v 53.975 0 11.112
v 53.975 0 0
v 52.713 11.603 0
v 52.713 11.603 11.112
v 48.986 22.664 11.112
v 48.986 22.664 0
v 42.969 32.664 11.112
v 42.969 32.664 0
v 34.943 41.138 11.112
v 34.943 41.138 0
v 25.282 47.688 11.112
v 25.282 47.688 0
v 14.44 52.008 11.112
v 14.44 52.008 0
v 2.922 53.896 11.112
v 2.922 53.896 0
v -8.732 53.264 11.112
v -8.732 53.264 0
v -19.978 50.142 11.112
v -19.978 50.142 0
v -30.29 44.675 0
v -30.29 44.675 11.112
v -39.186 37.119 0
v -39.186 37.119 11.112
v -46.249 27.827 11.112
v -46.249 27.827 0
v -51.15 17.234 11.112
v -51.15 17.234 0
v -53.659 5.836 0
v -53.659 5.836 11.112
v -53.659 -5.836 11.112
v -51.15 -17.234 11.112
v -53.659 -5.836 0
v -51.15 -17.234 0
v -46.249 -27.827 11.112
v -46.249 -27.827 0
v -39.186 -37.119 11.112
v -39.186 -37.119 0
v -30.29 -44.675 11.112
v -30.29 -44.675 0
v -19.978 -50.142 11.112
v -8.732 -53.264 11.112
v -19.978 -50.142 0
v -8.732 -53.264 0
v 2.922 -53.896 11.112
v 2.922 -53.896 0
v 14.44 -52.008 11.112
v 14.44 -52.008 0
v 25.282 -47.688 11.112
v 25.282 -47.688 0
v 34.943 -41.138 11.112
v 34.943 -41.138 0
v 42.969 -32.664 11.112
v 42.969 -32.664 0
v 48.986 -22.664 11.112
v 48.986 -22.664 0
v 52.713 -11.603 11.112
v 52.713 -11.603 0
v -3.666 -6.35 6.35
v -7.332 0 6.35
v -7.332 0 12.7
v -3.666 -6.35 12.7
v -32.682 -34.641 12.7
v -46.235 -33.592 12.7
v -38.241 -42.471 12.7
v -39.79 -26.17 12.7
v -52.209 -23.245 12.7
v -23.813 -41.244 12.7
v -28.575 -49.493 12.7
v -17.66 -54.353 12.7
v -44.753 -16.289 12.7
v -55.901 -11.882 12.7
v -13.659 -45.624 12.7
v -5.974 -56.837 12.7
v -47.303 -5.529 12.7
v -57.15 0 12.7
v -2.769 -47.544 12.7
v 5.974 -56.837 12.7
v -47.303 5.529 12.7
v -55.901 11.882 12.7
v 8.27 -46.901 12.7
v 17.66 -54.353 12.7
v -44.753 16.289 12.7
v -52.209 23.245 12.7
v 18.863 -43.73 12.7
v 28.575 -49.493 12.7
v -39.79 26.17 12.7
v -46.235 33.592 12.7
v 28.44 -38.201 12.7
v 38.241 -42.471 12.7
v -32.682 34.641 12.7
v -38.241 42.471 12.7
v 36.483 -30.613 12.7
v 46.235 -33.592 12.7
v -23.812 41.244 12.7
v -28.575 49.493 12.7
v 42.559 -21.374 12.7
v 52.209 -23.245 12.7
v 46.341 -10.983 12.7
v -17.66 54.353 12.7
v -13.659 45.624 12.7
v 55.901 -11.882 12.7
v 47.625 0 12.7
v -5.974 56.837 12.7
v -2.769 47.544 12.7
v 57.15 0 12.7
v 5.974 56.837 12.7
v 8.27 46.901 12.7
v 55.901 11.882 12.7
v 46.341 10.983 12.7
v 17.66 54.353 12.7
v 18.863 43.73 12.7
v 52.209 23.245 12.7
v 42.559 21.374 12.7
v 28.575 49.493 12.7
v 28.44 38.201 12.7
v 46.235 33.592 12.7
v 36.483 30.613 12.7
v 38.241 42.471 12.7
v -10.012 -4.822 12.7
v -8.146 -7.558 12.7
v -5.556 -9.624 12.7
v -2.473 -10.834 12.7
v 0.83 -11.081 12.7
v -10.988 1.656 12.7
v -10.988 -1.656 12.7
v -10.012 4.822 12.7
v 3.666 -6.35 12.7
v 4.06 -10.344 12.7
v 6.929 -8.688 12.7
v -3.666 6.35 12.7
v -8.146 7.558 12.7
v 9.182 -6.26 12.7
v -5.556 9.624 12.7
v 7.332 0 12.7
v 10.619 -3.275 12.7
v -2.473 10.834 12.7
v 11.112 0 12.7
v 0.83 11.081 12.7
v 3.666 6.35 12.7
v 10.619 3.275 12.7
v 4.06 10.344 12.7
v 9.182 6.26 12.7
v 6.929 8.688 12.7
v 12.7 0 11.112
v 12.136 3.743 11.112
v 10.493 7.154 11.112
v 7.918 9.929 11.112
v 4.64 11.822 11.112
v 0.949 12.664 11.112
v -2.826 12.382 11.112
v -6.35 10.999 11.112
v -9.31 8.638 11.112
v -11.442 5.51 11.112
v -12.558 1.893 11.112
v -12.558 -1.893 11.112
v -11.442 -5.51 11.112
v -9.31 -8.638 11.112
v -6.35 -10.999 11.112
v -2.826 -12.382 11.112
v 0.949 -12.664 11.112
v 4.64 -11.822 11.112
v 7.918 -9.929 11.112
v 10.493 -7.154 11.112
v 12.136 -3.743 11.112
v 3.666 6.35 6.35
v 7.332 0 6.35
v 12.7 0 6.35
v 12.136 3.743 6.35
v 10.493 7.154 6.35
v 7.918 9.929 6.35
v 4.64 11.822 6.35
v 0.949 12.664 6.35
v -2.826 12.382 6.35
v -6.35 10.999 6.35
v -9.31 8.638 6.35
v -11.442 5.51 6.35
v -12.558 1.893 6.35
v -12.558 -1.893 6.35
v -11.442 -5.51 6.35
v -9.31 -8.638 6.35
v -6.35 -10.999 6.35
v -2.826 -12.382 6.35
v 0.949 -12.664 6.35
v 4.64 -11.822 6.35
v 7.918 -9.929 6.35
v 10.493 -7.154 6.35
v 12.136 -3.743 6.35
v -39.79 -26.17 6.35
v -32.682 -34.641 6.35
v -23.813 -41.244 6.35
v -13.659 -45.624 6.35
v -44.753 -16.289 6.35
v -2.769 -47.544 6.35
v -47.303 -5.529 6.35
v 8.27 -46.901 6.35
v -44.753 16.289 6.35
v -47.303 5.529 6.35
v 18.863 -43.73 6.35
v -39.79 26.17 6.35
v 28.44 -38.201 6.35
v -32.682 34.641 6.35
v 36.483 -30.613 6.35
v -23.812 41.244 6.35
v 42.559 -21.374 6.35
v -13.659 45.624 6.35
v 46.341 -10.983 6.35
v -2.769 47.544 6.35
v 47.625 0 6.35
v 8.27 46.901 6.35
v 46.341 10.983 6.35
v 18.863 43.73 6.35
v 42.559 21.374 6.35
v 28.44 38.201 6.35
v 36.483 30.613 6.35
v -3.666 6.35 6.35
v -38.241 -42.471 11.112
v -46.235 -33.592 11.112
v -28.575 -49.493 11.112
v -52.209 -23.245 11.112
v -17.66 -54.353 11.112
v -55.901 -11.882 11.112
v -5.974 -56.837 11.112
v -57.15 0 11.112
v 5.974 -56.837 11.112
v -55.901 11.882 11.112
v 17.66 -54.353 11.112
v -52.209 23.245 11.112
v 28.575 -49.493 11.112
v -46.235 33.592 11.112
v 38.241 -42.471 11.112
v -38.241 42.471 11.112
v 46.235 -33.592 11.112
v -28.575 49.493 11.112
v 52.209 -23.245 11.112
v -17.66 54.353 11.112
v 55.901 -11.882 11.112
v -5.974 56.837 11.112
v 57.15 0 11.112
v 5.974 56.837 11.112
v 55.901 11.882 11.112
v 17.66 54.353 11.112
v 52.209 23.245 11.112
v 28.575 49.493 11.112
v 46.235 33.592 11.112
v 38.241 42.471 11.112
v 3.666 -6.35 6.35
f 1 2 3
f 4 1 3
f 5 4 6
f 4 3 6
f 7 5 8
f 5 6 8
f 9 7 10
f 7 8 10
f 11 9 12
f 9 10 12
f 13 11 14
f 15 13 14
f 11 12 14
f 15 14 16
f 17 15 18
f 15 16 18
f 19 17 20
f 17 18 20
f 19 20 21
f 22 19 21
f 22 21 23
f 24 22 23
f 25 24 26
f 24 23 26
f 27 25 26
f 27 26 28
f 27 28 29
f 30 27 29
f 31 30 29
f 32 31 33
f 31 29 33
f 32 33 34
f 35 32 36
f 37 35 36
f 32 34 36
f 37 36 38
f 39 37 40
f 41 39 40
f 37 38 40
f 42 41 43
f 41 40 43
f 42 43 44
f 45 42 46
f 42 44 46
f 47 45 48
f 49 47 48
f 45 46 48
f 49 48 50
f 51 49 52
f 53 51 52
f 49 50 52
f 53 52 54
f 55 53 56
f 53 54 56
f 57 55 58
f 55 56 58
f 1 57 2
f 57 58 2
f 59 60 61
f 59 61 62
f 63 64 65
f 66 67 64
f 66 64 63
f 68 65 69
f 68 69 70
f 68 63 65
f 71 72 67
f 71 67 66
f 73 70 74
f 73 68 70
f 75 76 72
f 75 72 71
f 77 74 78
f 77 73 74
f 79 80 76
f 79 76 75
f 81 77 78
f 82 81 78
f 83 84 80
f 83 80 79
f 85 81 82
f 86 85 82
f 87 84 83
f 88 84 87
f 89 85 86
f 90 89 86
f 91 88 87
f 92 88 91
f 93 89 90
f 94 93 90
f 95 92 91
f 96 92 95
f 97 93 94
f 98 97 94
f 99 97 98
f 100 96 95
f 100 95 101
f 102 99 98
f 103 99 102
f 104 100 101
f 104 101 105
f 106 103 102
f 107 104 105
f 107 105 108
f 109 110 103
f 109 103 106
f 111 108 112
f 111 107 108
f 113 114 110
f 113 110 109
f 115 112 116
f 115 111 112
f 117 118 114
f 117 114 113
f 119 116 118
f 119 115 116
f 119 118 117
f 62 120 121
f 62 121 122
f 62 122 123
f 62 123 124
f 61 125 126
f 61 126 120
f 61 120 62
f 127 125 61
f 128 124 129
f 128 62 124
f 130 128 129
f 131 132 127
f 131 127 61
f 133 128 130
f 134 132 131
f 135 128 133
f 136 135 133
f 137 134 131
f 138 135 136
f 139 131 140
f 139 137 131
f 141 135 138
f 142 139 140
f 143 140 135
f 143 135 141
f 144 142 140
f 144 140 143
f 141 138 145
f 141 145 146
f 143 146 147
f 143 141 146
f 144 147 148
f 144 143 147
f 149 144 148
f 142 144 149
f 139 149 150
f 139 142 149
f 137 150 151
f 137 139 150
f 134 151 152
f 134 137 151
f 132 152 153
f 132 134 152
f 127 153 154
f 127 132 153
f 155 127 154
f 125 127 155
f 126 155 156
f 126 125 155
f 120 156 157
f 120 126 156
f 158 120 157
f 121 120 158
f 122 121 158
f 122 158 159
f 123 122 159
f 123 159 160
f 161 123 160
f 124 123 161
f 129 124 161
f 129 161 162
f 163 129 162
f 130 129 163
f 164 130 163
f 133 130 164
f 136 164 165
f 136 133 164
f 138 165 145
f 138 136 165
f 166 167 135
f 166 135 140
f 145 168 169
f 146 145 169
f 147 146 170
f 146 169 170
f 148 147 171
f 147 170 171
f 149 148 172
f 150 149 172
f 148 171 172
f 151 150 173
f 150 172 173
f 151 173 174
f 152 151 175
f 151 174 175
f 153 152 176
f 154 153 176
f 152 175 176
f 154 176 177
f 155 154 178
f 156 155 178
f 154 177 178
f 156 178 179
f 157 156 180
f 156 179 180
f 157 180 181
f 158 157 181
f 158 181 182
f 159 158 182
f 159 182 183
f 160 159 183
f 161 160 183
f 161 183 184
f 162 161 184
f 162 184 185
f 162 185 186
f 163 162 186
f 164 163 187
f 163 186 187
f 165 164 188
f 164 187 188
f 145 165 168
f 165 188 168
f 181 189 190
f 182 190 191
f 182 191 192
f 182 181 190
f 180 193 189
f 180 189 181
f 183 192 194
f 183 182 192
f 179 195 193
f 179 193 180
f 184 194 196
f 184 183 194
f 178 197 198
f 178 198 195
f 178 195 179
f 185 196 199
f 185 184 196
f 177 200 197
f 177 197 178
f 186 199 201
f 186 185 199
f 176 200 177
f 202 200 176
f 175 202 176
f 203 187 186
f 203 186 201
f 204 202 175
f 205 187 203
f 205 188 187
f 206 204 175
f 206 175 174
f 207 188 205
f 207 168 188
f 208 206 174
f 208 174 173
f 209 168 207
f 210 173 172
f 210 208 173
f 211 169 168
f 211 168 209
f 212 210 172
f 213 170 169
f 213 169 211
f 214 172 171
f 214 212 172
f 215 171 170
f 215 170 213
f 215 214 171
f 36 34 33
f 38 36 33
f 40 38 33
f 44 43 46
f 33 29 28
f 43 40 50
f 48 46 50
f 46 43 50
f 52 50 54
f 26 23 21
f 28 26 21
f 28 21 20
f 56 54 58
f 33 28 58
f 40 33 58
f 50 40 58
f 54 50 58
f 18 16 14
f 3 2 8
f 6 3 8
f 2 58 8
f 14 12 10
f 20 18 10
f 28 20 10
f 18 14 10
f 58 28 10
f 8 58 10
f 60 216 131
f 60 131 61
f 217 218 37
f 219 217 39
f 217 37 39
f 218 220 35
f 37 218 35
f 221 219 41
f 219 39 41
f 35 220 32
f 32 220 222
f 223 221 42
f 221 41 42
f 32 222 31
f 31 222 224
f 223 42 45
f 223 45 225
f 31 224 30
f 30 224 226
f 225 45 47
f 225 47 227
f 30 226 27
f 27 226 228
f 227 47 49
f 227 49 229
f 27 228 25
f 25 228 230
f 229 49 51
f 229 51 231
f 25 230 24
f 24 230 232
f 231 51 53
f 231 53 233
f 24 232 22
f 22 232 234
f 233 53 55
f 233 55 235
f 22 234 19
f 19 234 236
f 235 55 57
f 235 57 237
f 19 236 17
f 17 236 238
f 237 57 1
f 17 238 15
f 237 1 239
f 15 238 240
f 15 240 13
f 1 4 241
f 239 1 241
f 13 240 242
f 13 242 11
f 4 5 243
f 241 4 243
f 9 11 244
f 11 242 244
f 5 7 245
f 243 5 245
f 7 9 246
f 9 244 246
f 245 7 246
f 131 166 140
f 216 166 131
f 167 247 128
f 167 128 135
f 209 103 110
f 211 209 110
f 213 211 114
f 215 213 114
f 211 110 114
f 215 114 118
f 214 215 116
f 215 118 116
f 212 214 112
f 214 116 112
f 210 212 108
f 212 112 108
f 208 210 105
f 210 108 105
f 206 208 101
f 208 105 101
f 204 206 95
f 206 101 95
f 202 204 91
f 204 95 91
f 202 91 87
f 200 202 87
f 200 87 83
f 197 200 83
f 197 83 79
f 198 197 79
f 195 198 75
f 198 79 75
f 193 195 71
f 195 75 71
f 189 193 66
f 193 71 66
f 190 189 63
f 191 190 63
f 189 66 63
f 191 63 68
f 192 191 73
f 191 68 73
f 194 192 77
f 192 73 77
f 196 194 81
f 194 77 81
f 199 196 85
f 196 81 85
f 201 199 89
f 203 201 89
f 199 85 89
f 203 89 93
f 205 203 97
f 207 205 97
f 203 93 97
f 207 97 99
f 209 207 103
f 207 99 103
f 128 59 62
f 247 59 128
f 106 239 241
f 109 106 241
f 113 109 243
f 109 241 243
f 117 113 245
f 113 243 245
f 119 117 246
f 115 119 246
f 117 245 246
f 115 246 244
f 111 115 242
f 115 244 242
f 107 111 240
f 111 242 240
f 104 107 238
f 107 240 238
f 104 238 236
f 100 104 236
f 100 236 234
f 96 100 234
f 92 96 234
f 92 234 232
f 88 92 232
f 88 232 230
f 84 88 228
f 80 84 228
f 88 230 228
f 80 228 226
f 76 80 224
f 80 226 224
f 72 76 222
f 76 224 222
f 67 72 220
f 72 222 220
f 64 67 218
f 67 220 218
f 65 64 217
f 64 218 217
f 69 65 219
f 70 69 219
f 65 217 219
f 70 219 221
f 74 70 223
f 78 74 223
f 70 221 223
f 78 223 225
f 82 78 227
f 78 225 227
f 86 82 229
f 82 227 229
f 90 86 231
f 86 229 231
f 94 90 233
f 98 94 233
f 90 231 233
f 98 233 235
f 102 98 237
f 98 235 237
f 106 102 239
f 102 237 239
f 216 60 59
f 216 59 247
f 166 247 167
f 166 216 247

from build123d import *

# Parameters (mm, degrees)
SKETCH1_R           = 53.975
BOSS_EXTRUDE1_DEPTH = 11.1125
SKETCH2_R           = 57.15
BOSS_EXTRUDE2_DEPTH = 1.5875
SKETCH3_R           = 47.625
CUT_EXTRUDE1_DEPTH  = 6.35
SKETCH4_R           = 12.7
BOSS_EXTRUDE3_DEPTH = 6.35
CHAMFER2_SIZE       = 1.5875


with BuildPart() as part:
    # Sketch1 → Boss-Extrude1 (new body)
    with BuildSketch(Plane.XY):
        Circle(SKETCH1_R)
    extrude(amount=BOSS_EXTRUDE1_DEPTH)

    # Sketch2 → Boss-Extrude2 (add)
    with BuildSketch(Plane.XY.offset(11.1125)):
        Circle(SKETCH2_R)
    extrude(amount=BOSS_EXTRUDE2_DEPTH)

    # Sketch3 → Cut-Extrude1 (cut)
    with BuildSketch(Plane.XY.offset(12.7)):
        Circle(SKETCH3_R)
    extrude(amount=-CUT_EXTRUDE1_DEPTH, mode=Mode.SUBTRACT)

    # Sketch4 → Boss-Extrude3 (add)
    with BuildSketch(Plane.XY.offset(6.35)):
        Circle(SKETCH4_R)
        Polygon((7.332348419, 0), (3.666174209, 6.35), (-3.666174209, 6.35), (-7.332348419, 0), (-3.666174209, -6.35), (3.666174209, -6.35), align=None, mode=Mode.SUBTRACT)
    extrude(amount=BOSS_EXTRUDE3_DEPTH)

    # Chamfer2
    chamfer2_edges = [part.edges().sort_by_distance(p)[0] for p in [
        (-12.7, 0, 12.7),
    ]]
    chamfer(chamfer2_edges, length=CHAMFER2_SIZE)


solid = part.part
